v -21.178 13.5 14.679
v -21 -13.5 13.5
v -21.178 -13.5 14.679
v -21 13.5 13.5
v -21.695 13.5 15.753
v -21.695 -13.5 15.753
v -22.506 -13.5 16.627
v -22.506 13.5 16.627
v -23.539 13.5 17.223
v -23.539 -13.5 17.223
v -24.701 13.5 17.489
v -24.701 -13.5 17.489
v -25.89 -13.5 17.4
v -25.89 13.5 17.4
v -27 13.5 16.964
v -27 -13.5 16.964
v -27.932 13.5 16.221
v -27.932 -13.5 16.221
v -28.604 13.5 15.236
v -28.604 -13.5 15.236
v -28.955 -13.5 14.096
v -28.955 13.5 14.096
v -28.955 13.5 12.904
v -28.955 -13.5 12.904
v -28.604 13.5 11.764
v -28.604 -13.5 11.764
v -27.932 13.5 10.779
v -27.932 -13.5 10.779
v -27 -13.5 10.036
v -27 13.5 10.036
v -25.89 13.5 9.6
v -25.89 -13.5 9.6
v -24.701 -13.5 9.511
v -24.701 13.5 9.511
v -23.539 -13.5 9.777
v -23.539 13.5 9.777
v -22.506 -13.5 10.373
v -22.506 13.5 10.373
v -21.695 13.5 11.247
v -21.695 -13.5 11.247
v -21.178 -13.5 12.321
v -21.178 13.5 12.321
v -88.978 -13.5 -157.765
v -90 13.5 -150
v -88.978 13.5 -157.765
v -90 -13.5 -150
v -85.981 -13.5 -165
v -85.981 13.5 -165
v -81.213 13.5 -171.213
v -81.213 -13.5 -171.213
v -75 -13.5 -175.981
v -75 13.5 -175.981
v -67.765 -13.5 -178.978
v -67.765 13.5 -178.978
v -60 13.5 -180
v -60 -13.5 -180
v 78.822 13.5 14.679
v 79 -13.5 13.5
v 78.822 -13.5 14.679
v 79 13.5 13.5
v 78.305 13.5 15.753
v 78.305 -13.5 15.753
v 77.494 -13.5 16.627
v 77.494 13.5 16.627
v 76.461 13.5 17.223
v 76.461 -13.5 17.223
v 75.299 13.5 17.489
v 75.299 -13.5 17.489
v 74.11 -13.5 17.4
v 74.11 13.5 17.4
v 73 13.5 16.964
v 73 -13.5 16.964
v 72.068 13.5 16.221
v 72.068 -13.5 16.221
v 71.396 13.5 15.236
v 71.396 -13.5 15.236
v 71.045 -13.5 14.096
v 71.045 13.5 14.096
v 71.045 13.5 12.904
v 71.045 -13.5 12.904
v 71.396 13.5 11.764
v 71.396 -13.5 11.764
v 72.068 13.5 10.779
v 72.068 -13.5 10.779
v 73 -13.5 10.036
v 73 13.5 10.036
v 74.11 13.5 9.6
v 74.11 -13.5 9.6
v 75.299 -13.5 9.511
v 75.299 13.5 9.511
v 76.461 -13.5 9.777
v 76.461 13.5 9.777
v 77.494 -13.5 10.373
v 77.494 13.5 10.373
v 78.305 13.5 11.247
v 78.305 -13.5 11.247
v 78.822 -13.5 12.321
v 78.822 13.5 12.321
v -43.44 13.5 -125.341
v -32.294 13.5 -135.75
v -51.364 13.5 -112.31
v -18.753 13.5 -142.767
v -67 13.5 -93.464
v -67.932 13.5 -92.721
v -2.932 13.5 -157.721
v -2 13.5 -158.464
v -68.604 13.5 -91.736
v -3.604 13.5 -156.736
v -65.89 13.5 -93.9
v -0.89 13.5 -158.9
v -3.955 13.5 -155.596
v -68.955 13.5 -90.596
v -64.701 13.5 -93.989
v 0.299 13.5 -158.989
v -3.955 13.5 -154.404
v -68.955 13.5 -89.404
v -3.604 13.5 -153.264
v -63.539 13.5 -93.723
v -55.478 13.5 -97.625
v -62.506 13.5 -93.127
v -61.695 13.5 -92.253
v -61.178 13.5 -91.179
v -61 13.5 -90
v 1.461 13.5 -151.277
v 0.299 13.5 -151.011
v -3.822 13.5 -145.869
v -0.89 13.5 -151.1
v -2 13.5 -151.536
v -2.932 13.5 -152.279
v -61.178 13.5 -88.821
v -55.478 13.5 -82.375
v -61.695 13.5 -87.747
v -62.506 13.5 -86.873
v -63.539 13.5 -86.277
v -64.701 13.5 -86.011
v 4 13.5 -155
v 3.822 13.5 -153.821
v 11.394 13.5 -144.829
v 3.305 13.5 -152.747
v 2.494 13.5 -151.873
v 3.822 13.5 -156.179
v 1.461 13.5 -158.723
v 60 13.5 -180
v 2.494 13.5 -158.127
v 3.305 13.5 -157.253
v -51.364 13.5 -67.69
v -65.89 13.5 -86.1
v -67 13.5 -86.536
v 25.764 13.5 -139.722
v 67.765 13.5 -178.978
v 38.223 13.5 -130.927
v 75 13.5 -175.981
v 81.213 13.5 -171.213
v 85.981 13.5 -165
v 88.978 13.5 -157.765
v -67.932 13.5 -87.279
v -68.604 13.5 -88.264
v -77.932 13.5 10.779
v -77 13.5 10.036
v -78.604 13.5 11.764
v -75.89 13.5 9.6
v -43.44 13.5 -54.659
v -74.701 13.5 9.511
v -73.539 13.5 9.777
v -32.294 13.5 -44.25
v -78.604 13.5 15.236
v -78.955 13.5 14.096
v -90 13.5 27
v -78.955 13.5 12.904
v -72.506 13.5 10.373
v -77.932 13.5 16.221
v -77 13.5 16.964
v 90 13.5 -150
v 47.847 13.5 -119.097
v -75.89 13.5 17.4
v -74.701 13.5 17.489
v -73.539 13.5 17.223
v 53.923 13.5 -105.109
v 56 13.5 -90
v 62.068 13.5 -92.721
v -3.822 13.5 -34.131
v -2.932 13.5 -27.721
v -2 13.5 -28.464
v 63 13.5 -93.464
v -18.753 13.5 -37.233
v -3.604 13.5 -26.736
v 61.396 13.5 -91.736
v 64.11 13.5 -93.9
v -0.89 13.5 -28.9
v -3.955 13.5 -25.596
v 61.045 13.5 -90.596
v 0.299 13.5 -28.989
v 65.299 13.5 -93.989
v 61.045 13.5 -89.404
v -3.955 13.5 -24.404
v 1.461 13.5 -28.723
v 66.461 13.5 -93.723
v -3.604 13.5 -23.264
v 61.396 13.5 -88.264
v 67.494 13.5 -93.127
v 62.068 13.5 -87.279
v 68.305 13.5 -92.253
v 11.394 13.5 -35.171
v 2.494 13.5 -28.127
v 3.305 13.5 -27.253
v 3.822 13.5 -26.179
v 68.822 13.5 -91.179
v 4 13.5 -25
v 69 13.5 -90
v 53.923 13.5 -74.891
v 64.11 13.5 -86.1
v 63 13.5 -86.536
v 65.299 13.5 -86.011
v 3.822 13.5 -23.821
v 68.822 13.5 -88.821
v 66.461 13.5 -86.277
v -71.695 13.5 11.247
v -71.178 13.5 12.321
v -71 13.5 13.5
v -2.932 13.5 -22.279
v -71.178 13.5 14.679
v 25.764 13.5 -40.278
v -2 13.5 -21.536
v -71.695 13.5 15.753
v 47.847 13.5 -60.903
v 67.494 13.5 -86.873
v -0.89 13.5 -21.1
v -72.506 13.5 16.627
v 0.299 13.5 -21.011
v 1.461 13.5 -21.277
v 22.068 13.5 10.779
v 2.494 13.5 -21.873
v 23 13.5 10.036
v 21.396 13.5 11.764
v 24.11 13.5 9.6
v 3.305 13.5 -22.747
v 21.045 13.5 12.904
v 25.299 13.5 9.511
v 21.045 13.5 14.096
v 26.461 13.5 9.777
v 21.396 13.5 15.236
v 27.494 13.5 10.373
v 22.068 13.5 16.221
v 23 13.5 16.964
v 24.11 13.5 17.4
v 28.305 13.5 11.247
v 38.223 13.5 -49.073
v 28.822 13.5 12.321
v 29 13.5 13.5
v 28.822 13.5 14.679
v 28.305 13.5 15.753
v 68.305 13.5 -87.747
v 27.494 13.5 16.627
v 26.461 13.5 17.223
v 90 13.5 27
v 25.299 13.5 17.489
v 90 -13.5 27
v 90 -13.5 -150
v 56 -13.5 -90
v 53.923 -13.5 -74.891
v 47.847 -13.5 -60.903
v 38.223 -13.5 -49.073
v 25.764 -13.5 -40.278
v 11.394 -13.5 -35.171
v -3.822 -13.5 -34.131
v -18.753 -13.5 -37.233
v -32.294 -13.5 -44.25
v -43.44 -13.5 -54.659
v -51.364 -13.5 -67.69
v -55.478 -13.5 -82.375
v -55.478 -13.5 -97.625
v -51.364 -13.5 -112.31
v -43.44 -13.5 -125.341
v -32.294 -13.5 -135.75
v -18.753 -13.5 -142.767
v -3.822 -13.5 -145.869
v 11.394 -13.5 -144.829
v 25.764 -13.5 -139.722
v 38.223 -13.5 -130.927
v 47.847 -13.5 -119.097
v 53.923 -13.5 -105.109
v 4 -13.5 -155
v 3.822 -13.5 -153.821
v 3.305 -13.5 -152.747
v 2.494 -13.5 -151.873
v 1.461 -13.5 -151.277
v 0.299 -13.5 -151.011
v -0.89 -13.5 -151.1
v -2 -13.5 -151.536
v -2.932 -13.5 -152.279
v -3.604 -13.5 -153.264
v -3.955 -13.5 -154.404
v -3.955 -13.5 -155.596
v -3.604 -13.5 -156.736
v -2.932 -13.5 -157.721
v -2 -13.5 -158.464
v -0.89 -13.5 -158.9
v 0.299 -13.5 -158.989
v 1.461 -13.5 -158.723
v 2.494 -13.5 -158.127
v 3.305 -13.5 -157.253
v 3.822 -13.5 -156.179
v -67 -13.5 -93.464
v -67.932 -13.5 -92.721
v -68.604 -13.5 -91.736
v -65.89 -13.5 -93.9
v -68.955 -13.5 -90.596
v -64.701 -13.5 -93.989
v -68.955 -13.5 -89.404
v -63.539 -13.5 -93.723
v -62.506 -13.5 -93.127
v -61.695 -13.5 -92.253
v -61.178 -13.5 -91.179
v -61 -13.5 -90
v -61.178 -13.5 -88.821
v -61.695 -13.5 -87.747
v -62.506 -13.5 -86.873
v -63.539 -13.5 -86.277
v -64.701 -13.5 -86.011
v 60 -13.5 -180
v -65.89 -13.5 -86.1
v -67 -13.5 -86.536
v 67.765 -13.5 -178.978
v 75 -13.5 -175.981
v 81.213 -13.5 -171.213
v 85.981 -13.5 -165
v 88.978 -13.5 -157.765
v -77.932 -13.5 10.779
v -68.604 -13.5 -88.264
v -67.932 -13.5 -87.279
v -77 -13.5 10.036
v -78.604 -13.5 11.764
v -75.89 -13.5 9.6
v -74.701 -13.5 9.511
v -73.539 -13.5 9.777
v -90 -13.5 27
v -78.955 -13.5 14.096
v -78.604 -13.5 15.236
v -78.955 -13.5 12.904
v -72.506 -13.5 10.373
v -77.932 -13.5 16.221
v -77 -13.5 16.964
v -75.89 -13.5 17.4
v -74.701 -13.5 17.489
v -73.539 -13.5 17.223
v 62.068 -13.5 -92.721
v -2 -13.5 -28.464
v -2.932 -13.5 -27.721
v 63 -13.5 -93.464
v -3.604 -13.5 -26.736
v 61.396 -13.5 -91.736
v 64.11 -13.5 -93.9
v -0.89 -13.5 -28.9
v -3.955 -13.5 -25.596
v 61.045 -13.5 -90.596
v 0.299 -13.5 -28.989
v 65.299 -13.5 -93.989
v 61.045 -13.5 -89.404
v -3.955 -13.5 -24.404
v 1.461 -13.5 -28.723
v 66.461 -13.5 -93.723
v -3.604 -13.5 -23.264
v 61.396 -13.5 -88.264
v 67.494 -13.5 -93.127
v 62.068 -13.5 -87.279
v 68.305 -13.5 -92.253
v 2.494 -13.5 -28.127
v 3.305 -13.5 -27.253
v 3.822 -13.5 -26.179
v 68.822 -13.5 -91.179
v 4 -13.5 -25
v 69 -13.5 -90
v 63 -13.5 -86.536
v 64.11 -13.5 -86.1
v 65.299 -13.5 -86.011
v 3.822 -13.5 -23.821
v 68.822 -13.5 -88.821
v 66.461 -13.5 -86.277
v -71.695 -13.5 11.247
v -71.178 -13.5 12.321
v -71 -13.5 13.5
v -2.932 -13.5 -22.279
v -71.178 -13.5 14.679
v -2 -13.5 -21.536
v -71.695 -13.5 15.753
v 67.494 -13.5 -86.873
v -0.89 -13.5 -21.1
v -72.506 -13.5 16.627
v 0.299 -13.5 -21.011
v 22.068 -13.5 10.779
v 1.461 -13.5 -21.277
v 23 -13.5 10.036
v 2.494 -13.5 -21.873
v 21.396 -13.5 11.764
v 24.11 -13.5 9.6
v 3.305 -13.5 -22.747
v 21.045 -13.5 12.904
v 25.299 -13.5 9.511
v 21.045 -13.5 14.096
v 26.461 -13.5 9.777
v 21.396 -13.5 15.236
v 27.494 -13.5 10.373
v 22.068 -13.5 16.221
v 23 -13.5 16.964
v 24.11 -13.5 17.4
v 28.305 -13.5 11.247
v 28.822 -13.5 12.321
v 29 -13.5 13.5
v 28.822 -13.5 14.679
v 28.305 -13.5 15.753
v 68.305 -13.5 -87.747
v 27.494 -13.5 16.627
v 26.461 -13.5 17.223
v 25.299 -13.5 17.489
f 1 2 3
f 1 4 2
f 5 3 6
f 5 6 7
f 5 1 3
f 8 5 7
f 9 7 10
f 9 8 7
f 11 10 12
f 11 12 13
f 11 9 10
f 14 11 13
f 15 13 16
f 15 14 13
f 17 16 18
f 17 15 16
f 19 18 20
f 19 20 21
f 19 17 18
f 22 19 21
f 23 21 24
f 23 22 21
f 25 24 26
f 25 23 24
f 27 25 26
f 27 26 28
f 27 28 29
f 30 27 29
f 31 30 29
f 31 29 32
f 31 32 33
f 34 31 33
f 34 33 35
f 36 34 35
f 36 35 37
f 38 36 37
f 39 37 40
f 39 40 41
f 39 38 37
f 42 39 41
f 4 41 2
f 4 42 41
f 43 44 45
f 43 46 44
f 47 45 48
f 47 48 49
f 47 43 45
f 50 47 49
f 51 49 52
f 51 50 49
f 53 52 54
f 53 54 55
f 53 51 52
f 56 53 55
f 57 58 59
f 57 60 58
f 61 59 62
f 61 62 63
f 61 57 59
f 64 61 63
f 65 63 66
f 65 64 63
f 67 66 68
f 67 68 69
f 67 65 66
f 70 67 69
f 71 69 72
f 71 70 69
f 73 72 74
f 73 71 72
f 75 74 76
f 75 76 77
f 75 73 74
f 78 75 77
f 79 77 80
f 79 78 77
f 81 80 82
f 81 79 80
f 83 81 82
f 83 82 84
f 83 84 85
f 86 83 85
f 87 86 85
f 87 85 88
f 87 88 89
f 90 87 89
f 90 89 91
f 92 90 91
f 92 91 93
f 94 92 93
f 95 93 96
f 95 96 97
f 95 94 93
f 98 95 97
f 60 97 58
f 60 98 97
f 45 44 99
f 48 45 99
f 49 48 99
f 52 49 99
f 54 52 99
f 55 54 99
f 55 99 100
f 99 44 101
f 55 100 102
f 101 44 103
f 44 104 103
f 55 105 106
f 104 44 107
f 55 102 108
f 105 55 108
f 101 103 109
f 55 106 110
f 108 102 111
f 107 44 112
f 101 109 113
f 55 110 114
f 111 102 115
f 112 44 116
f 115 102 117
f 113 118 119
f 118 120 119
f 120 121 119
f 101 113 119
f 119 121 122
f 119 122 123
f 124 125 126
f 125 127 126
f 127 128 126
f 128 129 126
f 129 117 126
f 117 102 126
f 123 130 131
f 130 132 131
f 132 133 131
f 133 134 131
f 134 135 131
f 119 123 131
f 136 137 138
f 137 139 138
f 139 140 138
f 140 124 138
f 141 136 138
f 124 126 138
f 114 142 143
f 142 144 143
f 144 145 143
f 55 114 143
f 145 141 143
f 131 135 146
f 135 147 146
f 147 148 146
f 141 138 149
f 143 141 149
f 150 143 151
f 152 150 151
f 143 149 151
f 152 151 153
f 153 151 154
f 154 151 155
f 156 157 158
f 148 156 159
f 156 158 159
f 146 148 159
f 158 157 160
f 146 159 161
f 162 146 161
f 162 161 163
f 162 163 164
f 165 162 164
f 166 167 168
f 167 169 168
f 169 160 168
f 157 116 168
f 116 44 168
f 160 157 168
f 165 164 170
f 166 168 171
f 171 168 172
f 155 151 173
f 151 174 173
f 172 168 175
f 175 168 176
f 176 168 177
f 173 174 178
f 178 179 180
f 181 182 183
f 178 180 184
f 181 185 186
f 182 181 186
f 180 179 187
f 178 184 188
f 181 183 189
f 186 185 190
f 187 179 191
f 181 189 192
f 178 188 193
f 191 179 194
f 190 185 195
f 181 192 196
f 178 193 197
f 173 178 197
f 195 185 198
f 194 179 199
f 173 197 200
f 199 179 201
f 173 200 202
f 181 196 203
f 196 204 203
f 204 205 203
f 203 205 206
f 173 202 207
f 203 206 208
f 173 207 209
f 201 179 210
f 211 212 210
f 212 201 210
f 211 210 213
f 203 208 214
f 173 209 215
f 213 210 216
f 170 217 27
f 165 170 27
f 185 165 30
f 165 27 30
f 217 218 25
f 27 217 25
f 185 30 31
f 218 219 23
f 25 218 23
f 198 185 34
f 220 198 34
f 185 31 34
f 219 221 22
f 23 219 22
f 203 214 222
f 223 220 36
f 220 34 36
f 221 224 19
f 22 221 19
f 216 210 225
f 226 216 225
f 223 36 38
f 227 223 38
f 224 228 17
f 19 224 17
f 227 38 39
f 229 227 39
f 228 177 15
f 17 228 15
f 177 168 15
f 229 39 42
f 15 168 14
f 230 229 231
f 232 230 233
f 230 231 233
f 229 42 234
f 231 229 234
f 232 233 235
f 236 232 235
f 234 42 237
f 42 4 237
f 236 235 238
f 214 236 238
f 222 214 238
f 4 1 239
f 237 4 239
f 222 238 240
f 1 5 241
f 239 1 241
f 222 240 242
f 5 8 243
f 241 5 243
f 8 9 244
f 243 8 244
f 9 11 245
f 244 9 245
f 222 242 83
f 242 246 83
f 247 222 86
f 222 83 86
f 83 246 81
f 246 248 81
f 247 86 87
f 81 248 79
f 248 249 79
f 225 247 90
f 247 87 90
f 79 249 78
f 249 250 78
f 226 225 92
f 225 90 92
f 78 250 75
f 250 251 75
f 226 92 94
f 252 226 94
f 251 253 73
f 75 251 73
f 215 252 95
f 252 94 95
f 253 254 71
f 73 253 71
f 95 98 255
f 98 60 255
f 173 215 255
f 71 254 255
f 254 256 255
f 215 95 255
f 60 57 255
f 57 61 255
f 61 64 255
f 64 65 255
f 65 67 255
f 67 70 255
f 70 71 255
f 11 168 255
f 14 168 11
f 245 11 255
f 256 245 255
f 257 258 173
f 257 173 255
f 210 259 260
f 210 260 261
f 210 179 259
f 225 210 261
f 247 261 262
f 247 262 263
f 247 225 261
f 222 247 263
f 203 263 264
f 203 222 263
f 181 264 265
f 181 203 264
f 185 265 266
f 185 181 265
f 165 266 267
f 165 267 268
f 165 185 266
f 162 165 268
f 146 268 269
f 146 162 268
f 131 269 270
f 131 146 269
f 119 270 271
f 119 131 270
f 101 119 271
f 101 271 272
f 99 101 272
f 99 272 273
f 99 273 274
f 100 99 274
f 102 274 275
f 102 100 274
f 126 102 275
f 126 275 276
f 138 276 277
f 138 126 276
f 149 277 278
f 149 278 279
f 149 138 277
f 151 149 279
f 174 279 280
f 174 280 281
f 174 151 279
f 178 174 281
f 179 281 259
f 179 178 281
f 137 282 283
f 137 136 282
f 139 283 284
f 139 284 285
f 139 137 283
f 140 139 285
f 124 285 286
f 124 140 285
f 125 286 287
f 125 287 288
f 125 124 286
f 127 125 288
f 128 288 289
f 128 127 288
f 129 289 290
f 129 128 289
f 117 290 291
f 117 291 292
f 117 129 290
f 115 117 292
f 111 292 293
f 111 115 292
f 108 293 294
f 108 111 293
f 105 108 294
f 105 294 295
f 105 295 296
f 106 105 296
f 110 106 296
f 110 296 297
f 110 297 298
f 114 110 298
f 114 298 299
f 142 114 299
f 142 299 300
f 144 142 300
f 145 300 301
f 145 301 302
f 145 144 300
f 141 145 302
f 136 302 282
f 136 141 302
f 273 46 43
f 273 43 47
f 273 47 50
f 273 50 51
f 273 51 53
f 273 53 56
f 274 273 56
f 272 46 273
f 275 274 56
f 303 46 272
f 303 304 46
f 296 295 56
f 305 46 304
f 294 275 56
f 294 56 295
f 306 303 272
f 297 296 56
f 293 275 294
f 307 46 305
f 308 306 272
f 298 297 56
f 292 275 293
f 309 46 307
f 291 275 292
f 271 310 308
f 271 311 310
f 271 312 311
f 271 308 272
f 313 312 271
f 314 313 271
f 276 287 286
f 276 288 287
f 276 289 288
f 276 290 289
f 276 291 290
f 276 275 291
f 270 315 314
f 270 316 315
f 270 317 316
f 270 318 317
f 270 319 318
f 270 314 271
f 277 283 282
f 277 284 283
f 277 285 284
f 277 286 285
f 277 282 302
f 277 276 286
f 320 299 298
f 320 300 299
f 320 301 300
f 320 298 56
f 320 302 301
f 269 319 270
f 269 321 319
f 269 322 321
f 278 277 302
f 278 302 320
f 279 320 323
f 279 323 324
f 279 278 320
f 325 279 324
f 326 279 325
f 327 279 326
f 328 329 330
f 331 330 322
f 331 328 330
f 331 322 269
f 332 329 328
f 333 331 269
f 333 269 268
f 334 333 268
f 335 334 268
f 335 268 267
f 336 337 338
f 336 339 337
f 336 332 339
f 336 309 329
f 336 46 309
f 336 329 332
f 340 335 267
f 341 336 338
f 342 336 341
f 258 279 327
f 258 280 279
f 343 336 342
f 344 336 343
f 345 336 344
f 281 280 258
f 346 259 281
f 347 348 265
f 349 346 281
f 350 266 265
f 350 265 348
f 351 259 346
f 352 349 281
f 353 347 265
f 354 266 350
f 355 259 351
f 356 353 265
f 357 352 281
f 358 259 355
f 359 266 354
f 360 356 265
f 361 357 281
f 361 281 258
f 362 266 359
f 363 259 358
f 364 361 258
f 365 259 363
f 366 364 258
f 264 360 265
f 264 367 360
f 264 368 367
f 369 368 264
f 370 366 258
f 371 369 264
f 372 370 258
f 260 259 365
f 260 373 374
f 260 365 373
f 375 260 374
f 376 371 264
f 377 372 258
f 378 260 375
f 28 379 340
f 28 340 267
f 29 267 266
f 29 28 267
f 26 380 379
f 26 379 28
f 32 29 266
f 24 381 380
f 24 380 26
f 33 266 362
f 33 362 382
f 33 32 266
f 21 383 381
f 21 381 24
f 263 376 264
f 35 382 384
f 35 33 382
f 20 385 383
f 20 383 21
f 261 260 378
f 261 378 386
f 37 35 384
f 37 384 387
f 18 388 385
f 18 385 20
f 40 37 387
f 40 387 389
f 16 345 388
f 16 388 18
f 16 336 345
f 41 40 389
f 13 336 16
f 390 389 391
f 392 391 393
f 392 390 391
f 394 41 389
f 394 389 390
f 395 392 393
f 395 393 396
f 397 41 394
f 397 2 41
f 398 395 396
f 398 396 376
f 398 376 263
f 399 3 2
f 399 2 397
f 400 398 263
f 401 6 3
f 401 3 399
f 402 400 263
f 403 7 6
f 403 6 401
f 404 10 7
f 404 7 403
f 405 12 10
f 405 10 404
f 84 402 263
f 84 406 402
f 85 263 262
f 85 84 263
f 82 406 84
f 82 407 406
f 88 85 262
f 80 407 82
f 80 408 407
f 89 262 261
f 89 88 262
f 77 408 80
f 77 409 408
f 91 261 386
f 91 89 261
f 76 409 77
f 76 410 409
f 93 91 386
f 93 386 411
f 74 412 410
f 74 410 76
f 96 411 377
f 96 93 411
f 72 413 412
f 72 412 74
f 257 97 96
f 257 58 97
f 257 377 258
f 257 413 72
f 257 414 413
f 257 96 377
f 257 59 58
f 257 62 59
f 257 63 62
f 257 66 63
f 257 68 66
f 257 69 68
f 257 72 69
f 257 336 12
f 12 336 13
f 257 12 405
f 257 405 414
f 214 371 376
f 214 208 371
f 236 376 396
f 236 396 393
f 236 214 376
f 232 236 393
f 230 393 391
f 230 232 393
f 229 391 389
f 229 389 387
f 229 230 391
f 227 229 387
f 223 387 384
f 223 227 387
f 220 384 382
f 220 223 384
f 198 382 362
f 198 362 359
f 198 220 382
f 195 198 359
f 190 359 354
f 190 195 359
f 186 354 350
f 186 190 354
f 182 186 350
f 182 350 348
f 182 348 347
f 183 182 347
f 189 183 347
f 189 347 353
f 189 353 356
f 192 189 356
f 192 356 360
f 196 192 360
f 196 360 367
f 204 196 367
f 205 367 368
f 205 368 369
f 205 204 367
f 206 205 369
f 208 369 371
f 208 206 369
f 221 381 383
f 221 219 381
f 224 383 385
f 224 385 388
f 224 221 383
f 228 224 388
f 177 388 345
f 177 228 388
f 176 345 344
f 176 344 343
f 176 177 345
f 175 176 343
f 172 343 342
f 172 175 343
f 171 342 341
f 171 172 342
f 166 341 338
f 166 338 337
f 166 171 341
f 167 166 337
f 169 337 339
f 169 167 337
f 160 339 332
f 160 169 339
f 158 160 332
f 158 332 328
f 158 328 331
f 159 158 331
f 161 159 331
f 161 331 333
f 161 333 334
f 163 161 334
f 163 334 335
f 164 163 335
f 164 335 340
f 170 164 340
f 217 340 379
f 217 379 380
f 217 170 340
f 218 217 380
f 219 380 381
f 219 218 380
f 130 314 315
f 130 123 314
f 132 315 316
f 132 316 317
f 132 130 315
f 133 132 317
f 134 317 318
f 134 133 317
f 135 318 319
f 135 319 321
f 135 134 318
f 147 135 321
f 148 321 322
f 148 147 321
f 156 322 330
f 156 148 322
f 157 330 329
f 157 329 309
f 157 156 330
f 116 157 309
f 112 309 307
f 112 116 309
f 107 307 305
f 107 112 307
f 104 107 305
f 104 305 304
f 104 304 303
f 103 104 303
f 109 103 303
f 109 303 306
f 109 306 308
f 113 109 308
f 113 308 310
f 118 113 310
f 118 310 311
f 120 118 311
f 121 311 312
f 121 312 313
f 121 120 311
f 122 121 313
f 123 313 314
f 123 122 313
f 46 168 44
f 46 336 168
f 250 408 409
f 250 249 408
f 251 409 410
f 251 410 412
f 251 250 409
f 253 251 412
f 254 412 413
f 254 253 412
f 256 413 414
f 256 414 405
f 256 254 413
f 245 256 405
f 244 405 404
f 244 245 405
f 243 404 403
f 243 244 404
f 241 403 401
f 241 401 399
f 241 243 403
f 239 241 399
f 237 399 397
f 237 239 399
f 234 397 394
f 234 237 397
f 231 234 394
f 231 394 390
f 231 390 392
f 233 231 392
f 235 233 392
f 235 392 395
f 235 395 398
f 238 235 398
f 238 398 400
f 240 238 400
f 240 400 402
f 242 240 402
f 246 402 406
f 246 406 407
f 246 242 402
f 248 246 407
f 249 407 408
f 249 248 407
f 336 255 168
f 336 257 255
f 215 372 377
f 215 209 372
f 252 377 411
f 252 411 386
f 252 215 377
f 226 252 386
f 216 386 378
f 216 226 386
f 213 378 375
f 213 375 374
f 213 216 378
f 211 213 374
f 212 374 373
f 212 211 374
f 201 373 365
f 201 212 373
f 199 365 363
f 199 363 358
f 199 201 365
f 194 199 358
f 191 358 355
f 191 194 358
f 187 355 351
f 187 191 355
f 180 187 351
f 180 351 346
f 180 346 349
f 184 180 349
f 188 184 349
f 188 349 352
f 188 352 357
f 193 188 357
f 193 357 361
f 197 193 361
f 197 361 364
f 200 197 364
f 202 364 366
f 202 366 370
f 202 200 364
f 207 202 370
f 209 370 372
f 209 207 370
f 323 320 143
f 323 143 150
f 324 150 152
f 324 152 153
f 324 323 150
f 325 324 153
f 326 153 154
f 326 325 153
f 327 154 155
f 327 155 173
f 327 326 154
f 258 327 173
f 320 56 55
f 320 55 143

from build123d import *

# Parameters (mm, degrees)
F0_R     = 4
F0_R_2   = 56
F1_DEPTH = 13.5


with BuildPart() as f1:
    # F0 (on Front) → F1 (new body, symmetric)
    with BuildSketch(Plane.XZ):
        with BuildLine():
            ThreePointArc((-90, -150), (-81.213203, -171.213203), (-60, -180))
            Line((-60, -180), (60, -180))
            ThreePointArc((60, -180), (81.213203, -171.213203), (90, -150))
            Line((90, -150), (90, 27))
            Line((90, 27), (-90, 27))
            Line((-90, 27), (-90, -150))
        make_face()
        with Locations((-65, -90)):
            Circle(F0_R, mode=Mode.SUBTRACT)
        with Locations((0, -155)):
            Circle(F0_R, mode=Mode.SUBTRACT)
        with Locations((0, -90)):
            Circle(F0_R_2, mode=Mode.SUBTRACT)
        with Locations((65, -90)):
            Circle(F0_R, mode=Mode.SUBTRACT)
        with Locations((-75, 13.5)):
            Circle(F0_R, mode=Mode.SUBTRACT)
        with Locations((-25, 13.5)):
            Circle(F0_R, mode=Mode.SUBTRACT)
        with Locations((0, -25)):
            Circle(F0_R, mode=Mode.SUBTRACT)
        with Locations((25, 13.5)):
            Circle(F0_R, mode=Mode.SUBTRACT)
        with Locations((75, 13.5)):
            Circle(F0_R, mode=Mode.SUBTRACT)
    extrude(amount=F1_DEPTH, both=True)


solid = f1.part
